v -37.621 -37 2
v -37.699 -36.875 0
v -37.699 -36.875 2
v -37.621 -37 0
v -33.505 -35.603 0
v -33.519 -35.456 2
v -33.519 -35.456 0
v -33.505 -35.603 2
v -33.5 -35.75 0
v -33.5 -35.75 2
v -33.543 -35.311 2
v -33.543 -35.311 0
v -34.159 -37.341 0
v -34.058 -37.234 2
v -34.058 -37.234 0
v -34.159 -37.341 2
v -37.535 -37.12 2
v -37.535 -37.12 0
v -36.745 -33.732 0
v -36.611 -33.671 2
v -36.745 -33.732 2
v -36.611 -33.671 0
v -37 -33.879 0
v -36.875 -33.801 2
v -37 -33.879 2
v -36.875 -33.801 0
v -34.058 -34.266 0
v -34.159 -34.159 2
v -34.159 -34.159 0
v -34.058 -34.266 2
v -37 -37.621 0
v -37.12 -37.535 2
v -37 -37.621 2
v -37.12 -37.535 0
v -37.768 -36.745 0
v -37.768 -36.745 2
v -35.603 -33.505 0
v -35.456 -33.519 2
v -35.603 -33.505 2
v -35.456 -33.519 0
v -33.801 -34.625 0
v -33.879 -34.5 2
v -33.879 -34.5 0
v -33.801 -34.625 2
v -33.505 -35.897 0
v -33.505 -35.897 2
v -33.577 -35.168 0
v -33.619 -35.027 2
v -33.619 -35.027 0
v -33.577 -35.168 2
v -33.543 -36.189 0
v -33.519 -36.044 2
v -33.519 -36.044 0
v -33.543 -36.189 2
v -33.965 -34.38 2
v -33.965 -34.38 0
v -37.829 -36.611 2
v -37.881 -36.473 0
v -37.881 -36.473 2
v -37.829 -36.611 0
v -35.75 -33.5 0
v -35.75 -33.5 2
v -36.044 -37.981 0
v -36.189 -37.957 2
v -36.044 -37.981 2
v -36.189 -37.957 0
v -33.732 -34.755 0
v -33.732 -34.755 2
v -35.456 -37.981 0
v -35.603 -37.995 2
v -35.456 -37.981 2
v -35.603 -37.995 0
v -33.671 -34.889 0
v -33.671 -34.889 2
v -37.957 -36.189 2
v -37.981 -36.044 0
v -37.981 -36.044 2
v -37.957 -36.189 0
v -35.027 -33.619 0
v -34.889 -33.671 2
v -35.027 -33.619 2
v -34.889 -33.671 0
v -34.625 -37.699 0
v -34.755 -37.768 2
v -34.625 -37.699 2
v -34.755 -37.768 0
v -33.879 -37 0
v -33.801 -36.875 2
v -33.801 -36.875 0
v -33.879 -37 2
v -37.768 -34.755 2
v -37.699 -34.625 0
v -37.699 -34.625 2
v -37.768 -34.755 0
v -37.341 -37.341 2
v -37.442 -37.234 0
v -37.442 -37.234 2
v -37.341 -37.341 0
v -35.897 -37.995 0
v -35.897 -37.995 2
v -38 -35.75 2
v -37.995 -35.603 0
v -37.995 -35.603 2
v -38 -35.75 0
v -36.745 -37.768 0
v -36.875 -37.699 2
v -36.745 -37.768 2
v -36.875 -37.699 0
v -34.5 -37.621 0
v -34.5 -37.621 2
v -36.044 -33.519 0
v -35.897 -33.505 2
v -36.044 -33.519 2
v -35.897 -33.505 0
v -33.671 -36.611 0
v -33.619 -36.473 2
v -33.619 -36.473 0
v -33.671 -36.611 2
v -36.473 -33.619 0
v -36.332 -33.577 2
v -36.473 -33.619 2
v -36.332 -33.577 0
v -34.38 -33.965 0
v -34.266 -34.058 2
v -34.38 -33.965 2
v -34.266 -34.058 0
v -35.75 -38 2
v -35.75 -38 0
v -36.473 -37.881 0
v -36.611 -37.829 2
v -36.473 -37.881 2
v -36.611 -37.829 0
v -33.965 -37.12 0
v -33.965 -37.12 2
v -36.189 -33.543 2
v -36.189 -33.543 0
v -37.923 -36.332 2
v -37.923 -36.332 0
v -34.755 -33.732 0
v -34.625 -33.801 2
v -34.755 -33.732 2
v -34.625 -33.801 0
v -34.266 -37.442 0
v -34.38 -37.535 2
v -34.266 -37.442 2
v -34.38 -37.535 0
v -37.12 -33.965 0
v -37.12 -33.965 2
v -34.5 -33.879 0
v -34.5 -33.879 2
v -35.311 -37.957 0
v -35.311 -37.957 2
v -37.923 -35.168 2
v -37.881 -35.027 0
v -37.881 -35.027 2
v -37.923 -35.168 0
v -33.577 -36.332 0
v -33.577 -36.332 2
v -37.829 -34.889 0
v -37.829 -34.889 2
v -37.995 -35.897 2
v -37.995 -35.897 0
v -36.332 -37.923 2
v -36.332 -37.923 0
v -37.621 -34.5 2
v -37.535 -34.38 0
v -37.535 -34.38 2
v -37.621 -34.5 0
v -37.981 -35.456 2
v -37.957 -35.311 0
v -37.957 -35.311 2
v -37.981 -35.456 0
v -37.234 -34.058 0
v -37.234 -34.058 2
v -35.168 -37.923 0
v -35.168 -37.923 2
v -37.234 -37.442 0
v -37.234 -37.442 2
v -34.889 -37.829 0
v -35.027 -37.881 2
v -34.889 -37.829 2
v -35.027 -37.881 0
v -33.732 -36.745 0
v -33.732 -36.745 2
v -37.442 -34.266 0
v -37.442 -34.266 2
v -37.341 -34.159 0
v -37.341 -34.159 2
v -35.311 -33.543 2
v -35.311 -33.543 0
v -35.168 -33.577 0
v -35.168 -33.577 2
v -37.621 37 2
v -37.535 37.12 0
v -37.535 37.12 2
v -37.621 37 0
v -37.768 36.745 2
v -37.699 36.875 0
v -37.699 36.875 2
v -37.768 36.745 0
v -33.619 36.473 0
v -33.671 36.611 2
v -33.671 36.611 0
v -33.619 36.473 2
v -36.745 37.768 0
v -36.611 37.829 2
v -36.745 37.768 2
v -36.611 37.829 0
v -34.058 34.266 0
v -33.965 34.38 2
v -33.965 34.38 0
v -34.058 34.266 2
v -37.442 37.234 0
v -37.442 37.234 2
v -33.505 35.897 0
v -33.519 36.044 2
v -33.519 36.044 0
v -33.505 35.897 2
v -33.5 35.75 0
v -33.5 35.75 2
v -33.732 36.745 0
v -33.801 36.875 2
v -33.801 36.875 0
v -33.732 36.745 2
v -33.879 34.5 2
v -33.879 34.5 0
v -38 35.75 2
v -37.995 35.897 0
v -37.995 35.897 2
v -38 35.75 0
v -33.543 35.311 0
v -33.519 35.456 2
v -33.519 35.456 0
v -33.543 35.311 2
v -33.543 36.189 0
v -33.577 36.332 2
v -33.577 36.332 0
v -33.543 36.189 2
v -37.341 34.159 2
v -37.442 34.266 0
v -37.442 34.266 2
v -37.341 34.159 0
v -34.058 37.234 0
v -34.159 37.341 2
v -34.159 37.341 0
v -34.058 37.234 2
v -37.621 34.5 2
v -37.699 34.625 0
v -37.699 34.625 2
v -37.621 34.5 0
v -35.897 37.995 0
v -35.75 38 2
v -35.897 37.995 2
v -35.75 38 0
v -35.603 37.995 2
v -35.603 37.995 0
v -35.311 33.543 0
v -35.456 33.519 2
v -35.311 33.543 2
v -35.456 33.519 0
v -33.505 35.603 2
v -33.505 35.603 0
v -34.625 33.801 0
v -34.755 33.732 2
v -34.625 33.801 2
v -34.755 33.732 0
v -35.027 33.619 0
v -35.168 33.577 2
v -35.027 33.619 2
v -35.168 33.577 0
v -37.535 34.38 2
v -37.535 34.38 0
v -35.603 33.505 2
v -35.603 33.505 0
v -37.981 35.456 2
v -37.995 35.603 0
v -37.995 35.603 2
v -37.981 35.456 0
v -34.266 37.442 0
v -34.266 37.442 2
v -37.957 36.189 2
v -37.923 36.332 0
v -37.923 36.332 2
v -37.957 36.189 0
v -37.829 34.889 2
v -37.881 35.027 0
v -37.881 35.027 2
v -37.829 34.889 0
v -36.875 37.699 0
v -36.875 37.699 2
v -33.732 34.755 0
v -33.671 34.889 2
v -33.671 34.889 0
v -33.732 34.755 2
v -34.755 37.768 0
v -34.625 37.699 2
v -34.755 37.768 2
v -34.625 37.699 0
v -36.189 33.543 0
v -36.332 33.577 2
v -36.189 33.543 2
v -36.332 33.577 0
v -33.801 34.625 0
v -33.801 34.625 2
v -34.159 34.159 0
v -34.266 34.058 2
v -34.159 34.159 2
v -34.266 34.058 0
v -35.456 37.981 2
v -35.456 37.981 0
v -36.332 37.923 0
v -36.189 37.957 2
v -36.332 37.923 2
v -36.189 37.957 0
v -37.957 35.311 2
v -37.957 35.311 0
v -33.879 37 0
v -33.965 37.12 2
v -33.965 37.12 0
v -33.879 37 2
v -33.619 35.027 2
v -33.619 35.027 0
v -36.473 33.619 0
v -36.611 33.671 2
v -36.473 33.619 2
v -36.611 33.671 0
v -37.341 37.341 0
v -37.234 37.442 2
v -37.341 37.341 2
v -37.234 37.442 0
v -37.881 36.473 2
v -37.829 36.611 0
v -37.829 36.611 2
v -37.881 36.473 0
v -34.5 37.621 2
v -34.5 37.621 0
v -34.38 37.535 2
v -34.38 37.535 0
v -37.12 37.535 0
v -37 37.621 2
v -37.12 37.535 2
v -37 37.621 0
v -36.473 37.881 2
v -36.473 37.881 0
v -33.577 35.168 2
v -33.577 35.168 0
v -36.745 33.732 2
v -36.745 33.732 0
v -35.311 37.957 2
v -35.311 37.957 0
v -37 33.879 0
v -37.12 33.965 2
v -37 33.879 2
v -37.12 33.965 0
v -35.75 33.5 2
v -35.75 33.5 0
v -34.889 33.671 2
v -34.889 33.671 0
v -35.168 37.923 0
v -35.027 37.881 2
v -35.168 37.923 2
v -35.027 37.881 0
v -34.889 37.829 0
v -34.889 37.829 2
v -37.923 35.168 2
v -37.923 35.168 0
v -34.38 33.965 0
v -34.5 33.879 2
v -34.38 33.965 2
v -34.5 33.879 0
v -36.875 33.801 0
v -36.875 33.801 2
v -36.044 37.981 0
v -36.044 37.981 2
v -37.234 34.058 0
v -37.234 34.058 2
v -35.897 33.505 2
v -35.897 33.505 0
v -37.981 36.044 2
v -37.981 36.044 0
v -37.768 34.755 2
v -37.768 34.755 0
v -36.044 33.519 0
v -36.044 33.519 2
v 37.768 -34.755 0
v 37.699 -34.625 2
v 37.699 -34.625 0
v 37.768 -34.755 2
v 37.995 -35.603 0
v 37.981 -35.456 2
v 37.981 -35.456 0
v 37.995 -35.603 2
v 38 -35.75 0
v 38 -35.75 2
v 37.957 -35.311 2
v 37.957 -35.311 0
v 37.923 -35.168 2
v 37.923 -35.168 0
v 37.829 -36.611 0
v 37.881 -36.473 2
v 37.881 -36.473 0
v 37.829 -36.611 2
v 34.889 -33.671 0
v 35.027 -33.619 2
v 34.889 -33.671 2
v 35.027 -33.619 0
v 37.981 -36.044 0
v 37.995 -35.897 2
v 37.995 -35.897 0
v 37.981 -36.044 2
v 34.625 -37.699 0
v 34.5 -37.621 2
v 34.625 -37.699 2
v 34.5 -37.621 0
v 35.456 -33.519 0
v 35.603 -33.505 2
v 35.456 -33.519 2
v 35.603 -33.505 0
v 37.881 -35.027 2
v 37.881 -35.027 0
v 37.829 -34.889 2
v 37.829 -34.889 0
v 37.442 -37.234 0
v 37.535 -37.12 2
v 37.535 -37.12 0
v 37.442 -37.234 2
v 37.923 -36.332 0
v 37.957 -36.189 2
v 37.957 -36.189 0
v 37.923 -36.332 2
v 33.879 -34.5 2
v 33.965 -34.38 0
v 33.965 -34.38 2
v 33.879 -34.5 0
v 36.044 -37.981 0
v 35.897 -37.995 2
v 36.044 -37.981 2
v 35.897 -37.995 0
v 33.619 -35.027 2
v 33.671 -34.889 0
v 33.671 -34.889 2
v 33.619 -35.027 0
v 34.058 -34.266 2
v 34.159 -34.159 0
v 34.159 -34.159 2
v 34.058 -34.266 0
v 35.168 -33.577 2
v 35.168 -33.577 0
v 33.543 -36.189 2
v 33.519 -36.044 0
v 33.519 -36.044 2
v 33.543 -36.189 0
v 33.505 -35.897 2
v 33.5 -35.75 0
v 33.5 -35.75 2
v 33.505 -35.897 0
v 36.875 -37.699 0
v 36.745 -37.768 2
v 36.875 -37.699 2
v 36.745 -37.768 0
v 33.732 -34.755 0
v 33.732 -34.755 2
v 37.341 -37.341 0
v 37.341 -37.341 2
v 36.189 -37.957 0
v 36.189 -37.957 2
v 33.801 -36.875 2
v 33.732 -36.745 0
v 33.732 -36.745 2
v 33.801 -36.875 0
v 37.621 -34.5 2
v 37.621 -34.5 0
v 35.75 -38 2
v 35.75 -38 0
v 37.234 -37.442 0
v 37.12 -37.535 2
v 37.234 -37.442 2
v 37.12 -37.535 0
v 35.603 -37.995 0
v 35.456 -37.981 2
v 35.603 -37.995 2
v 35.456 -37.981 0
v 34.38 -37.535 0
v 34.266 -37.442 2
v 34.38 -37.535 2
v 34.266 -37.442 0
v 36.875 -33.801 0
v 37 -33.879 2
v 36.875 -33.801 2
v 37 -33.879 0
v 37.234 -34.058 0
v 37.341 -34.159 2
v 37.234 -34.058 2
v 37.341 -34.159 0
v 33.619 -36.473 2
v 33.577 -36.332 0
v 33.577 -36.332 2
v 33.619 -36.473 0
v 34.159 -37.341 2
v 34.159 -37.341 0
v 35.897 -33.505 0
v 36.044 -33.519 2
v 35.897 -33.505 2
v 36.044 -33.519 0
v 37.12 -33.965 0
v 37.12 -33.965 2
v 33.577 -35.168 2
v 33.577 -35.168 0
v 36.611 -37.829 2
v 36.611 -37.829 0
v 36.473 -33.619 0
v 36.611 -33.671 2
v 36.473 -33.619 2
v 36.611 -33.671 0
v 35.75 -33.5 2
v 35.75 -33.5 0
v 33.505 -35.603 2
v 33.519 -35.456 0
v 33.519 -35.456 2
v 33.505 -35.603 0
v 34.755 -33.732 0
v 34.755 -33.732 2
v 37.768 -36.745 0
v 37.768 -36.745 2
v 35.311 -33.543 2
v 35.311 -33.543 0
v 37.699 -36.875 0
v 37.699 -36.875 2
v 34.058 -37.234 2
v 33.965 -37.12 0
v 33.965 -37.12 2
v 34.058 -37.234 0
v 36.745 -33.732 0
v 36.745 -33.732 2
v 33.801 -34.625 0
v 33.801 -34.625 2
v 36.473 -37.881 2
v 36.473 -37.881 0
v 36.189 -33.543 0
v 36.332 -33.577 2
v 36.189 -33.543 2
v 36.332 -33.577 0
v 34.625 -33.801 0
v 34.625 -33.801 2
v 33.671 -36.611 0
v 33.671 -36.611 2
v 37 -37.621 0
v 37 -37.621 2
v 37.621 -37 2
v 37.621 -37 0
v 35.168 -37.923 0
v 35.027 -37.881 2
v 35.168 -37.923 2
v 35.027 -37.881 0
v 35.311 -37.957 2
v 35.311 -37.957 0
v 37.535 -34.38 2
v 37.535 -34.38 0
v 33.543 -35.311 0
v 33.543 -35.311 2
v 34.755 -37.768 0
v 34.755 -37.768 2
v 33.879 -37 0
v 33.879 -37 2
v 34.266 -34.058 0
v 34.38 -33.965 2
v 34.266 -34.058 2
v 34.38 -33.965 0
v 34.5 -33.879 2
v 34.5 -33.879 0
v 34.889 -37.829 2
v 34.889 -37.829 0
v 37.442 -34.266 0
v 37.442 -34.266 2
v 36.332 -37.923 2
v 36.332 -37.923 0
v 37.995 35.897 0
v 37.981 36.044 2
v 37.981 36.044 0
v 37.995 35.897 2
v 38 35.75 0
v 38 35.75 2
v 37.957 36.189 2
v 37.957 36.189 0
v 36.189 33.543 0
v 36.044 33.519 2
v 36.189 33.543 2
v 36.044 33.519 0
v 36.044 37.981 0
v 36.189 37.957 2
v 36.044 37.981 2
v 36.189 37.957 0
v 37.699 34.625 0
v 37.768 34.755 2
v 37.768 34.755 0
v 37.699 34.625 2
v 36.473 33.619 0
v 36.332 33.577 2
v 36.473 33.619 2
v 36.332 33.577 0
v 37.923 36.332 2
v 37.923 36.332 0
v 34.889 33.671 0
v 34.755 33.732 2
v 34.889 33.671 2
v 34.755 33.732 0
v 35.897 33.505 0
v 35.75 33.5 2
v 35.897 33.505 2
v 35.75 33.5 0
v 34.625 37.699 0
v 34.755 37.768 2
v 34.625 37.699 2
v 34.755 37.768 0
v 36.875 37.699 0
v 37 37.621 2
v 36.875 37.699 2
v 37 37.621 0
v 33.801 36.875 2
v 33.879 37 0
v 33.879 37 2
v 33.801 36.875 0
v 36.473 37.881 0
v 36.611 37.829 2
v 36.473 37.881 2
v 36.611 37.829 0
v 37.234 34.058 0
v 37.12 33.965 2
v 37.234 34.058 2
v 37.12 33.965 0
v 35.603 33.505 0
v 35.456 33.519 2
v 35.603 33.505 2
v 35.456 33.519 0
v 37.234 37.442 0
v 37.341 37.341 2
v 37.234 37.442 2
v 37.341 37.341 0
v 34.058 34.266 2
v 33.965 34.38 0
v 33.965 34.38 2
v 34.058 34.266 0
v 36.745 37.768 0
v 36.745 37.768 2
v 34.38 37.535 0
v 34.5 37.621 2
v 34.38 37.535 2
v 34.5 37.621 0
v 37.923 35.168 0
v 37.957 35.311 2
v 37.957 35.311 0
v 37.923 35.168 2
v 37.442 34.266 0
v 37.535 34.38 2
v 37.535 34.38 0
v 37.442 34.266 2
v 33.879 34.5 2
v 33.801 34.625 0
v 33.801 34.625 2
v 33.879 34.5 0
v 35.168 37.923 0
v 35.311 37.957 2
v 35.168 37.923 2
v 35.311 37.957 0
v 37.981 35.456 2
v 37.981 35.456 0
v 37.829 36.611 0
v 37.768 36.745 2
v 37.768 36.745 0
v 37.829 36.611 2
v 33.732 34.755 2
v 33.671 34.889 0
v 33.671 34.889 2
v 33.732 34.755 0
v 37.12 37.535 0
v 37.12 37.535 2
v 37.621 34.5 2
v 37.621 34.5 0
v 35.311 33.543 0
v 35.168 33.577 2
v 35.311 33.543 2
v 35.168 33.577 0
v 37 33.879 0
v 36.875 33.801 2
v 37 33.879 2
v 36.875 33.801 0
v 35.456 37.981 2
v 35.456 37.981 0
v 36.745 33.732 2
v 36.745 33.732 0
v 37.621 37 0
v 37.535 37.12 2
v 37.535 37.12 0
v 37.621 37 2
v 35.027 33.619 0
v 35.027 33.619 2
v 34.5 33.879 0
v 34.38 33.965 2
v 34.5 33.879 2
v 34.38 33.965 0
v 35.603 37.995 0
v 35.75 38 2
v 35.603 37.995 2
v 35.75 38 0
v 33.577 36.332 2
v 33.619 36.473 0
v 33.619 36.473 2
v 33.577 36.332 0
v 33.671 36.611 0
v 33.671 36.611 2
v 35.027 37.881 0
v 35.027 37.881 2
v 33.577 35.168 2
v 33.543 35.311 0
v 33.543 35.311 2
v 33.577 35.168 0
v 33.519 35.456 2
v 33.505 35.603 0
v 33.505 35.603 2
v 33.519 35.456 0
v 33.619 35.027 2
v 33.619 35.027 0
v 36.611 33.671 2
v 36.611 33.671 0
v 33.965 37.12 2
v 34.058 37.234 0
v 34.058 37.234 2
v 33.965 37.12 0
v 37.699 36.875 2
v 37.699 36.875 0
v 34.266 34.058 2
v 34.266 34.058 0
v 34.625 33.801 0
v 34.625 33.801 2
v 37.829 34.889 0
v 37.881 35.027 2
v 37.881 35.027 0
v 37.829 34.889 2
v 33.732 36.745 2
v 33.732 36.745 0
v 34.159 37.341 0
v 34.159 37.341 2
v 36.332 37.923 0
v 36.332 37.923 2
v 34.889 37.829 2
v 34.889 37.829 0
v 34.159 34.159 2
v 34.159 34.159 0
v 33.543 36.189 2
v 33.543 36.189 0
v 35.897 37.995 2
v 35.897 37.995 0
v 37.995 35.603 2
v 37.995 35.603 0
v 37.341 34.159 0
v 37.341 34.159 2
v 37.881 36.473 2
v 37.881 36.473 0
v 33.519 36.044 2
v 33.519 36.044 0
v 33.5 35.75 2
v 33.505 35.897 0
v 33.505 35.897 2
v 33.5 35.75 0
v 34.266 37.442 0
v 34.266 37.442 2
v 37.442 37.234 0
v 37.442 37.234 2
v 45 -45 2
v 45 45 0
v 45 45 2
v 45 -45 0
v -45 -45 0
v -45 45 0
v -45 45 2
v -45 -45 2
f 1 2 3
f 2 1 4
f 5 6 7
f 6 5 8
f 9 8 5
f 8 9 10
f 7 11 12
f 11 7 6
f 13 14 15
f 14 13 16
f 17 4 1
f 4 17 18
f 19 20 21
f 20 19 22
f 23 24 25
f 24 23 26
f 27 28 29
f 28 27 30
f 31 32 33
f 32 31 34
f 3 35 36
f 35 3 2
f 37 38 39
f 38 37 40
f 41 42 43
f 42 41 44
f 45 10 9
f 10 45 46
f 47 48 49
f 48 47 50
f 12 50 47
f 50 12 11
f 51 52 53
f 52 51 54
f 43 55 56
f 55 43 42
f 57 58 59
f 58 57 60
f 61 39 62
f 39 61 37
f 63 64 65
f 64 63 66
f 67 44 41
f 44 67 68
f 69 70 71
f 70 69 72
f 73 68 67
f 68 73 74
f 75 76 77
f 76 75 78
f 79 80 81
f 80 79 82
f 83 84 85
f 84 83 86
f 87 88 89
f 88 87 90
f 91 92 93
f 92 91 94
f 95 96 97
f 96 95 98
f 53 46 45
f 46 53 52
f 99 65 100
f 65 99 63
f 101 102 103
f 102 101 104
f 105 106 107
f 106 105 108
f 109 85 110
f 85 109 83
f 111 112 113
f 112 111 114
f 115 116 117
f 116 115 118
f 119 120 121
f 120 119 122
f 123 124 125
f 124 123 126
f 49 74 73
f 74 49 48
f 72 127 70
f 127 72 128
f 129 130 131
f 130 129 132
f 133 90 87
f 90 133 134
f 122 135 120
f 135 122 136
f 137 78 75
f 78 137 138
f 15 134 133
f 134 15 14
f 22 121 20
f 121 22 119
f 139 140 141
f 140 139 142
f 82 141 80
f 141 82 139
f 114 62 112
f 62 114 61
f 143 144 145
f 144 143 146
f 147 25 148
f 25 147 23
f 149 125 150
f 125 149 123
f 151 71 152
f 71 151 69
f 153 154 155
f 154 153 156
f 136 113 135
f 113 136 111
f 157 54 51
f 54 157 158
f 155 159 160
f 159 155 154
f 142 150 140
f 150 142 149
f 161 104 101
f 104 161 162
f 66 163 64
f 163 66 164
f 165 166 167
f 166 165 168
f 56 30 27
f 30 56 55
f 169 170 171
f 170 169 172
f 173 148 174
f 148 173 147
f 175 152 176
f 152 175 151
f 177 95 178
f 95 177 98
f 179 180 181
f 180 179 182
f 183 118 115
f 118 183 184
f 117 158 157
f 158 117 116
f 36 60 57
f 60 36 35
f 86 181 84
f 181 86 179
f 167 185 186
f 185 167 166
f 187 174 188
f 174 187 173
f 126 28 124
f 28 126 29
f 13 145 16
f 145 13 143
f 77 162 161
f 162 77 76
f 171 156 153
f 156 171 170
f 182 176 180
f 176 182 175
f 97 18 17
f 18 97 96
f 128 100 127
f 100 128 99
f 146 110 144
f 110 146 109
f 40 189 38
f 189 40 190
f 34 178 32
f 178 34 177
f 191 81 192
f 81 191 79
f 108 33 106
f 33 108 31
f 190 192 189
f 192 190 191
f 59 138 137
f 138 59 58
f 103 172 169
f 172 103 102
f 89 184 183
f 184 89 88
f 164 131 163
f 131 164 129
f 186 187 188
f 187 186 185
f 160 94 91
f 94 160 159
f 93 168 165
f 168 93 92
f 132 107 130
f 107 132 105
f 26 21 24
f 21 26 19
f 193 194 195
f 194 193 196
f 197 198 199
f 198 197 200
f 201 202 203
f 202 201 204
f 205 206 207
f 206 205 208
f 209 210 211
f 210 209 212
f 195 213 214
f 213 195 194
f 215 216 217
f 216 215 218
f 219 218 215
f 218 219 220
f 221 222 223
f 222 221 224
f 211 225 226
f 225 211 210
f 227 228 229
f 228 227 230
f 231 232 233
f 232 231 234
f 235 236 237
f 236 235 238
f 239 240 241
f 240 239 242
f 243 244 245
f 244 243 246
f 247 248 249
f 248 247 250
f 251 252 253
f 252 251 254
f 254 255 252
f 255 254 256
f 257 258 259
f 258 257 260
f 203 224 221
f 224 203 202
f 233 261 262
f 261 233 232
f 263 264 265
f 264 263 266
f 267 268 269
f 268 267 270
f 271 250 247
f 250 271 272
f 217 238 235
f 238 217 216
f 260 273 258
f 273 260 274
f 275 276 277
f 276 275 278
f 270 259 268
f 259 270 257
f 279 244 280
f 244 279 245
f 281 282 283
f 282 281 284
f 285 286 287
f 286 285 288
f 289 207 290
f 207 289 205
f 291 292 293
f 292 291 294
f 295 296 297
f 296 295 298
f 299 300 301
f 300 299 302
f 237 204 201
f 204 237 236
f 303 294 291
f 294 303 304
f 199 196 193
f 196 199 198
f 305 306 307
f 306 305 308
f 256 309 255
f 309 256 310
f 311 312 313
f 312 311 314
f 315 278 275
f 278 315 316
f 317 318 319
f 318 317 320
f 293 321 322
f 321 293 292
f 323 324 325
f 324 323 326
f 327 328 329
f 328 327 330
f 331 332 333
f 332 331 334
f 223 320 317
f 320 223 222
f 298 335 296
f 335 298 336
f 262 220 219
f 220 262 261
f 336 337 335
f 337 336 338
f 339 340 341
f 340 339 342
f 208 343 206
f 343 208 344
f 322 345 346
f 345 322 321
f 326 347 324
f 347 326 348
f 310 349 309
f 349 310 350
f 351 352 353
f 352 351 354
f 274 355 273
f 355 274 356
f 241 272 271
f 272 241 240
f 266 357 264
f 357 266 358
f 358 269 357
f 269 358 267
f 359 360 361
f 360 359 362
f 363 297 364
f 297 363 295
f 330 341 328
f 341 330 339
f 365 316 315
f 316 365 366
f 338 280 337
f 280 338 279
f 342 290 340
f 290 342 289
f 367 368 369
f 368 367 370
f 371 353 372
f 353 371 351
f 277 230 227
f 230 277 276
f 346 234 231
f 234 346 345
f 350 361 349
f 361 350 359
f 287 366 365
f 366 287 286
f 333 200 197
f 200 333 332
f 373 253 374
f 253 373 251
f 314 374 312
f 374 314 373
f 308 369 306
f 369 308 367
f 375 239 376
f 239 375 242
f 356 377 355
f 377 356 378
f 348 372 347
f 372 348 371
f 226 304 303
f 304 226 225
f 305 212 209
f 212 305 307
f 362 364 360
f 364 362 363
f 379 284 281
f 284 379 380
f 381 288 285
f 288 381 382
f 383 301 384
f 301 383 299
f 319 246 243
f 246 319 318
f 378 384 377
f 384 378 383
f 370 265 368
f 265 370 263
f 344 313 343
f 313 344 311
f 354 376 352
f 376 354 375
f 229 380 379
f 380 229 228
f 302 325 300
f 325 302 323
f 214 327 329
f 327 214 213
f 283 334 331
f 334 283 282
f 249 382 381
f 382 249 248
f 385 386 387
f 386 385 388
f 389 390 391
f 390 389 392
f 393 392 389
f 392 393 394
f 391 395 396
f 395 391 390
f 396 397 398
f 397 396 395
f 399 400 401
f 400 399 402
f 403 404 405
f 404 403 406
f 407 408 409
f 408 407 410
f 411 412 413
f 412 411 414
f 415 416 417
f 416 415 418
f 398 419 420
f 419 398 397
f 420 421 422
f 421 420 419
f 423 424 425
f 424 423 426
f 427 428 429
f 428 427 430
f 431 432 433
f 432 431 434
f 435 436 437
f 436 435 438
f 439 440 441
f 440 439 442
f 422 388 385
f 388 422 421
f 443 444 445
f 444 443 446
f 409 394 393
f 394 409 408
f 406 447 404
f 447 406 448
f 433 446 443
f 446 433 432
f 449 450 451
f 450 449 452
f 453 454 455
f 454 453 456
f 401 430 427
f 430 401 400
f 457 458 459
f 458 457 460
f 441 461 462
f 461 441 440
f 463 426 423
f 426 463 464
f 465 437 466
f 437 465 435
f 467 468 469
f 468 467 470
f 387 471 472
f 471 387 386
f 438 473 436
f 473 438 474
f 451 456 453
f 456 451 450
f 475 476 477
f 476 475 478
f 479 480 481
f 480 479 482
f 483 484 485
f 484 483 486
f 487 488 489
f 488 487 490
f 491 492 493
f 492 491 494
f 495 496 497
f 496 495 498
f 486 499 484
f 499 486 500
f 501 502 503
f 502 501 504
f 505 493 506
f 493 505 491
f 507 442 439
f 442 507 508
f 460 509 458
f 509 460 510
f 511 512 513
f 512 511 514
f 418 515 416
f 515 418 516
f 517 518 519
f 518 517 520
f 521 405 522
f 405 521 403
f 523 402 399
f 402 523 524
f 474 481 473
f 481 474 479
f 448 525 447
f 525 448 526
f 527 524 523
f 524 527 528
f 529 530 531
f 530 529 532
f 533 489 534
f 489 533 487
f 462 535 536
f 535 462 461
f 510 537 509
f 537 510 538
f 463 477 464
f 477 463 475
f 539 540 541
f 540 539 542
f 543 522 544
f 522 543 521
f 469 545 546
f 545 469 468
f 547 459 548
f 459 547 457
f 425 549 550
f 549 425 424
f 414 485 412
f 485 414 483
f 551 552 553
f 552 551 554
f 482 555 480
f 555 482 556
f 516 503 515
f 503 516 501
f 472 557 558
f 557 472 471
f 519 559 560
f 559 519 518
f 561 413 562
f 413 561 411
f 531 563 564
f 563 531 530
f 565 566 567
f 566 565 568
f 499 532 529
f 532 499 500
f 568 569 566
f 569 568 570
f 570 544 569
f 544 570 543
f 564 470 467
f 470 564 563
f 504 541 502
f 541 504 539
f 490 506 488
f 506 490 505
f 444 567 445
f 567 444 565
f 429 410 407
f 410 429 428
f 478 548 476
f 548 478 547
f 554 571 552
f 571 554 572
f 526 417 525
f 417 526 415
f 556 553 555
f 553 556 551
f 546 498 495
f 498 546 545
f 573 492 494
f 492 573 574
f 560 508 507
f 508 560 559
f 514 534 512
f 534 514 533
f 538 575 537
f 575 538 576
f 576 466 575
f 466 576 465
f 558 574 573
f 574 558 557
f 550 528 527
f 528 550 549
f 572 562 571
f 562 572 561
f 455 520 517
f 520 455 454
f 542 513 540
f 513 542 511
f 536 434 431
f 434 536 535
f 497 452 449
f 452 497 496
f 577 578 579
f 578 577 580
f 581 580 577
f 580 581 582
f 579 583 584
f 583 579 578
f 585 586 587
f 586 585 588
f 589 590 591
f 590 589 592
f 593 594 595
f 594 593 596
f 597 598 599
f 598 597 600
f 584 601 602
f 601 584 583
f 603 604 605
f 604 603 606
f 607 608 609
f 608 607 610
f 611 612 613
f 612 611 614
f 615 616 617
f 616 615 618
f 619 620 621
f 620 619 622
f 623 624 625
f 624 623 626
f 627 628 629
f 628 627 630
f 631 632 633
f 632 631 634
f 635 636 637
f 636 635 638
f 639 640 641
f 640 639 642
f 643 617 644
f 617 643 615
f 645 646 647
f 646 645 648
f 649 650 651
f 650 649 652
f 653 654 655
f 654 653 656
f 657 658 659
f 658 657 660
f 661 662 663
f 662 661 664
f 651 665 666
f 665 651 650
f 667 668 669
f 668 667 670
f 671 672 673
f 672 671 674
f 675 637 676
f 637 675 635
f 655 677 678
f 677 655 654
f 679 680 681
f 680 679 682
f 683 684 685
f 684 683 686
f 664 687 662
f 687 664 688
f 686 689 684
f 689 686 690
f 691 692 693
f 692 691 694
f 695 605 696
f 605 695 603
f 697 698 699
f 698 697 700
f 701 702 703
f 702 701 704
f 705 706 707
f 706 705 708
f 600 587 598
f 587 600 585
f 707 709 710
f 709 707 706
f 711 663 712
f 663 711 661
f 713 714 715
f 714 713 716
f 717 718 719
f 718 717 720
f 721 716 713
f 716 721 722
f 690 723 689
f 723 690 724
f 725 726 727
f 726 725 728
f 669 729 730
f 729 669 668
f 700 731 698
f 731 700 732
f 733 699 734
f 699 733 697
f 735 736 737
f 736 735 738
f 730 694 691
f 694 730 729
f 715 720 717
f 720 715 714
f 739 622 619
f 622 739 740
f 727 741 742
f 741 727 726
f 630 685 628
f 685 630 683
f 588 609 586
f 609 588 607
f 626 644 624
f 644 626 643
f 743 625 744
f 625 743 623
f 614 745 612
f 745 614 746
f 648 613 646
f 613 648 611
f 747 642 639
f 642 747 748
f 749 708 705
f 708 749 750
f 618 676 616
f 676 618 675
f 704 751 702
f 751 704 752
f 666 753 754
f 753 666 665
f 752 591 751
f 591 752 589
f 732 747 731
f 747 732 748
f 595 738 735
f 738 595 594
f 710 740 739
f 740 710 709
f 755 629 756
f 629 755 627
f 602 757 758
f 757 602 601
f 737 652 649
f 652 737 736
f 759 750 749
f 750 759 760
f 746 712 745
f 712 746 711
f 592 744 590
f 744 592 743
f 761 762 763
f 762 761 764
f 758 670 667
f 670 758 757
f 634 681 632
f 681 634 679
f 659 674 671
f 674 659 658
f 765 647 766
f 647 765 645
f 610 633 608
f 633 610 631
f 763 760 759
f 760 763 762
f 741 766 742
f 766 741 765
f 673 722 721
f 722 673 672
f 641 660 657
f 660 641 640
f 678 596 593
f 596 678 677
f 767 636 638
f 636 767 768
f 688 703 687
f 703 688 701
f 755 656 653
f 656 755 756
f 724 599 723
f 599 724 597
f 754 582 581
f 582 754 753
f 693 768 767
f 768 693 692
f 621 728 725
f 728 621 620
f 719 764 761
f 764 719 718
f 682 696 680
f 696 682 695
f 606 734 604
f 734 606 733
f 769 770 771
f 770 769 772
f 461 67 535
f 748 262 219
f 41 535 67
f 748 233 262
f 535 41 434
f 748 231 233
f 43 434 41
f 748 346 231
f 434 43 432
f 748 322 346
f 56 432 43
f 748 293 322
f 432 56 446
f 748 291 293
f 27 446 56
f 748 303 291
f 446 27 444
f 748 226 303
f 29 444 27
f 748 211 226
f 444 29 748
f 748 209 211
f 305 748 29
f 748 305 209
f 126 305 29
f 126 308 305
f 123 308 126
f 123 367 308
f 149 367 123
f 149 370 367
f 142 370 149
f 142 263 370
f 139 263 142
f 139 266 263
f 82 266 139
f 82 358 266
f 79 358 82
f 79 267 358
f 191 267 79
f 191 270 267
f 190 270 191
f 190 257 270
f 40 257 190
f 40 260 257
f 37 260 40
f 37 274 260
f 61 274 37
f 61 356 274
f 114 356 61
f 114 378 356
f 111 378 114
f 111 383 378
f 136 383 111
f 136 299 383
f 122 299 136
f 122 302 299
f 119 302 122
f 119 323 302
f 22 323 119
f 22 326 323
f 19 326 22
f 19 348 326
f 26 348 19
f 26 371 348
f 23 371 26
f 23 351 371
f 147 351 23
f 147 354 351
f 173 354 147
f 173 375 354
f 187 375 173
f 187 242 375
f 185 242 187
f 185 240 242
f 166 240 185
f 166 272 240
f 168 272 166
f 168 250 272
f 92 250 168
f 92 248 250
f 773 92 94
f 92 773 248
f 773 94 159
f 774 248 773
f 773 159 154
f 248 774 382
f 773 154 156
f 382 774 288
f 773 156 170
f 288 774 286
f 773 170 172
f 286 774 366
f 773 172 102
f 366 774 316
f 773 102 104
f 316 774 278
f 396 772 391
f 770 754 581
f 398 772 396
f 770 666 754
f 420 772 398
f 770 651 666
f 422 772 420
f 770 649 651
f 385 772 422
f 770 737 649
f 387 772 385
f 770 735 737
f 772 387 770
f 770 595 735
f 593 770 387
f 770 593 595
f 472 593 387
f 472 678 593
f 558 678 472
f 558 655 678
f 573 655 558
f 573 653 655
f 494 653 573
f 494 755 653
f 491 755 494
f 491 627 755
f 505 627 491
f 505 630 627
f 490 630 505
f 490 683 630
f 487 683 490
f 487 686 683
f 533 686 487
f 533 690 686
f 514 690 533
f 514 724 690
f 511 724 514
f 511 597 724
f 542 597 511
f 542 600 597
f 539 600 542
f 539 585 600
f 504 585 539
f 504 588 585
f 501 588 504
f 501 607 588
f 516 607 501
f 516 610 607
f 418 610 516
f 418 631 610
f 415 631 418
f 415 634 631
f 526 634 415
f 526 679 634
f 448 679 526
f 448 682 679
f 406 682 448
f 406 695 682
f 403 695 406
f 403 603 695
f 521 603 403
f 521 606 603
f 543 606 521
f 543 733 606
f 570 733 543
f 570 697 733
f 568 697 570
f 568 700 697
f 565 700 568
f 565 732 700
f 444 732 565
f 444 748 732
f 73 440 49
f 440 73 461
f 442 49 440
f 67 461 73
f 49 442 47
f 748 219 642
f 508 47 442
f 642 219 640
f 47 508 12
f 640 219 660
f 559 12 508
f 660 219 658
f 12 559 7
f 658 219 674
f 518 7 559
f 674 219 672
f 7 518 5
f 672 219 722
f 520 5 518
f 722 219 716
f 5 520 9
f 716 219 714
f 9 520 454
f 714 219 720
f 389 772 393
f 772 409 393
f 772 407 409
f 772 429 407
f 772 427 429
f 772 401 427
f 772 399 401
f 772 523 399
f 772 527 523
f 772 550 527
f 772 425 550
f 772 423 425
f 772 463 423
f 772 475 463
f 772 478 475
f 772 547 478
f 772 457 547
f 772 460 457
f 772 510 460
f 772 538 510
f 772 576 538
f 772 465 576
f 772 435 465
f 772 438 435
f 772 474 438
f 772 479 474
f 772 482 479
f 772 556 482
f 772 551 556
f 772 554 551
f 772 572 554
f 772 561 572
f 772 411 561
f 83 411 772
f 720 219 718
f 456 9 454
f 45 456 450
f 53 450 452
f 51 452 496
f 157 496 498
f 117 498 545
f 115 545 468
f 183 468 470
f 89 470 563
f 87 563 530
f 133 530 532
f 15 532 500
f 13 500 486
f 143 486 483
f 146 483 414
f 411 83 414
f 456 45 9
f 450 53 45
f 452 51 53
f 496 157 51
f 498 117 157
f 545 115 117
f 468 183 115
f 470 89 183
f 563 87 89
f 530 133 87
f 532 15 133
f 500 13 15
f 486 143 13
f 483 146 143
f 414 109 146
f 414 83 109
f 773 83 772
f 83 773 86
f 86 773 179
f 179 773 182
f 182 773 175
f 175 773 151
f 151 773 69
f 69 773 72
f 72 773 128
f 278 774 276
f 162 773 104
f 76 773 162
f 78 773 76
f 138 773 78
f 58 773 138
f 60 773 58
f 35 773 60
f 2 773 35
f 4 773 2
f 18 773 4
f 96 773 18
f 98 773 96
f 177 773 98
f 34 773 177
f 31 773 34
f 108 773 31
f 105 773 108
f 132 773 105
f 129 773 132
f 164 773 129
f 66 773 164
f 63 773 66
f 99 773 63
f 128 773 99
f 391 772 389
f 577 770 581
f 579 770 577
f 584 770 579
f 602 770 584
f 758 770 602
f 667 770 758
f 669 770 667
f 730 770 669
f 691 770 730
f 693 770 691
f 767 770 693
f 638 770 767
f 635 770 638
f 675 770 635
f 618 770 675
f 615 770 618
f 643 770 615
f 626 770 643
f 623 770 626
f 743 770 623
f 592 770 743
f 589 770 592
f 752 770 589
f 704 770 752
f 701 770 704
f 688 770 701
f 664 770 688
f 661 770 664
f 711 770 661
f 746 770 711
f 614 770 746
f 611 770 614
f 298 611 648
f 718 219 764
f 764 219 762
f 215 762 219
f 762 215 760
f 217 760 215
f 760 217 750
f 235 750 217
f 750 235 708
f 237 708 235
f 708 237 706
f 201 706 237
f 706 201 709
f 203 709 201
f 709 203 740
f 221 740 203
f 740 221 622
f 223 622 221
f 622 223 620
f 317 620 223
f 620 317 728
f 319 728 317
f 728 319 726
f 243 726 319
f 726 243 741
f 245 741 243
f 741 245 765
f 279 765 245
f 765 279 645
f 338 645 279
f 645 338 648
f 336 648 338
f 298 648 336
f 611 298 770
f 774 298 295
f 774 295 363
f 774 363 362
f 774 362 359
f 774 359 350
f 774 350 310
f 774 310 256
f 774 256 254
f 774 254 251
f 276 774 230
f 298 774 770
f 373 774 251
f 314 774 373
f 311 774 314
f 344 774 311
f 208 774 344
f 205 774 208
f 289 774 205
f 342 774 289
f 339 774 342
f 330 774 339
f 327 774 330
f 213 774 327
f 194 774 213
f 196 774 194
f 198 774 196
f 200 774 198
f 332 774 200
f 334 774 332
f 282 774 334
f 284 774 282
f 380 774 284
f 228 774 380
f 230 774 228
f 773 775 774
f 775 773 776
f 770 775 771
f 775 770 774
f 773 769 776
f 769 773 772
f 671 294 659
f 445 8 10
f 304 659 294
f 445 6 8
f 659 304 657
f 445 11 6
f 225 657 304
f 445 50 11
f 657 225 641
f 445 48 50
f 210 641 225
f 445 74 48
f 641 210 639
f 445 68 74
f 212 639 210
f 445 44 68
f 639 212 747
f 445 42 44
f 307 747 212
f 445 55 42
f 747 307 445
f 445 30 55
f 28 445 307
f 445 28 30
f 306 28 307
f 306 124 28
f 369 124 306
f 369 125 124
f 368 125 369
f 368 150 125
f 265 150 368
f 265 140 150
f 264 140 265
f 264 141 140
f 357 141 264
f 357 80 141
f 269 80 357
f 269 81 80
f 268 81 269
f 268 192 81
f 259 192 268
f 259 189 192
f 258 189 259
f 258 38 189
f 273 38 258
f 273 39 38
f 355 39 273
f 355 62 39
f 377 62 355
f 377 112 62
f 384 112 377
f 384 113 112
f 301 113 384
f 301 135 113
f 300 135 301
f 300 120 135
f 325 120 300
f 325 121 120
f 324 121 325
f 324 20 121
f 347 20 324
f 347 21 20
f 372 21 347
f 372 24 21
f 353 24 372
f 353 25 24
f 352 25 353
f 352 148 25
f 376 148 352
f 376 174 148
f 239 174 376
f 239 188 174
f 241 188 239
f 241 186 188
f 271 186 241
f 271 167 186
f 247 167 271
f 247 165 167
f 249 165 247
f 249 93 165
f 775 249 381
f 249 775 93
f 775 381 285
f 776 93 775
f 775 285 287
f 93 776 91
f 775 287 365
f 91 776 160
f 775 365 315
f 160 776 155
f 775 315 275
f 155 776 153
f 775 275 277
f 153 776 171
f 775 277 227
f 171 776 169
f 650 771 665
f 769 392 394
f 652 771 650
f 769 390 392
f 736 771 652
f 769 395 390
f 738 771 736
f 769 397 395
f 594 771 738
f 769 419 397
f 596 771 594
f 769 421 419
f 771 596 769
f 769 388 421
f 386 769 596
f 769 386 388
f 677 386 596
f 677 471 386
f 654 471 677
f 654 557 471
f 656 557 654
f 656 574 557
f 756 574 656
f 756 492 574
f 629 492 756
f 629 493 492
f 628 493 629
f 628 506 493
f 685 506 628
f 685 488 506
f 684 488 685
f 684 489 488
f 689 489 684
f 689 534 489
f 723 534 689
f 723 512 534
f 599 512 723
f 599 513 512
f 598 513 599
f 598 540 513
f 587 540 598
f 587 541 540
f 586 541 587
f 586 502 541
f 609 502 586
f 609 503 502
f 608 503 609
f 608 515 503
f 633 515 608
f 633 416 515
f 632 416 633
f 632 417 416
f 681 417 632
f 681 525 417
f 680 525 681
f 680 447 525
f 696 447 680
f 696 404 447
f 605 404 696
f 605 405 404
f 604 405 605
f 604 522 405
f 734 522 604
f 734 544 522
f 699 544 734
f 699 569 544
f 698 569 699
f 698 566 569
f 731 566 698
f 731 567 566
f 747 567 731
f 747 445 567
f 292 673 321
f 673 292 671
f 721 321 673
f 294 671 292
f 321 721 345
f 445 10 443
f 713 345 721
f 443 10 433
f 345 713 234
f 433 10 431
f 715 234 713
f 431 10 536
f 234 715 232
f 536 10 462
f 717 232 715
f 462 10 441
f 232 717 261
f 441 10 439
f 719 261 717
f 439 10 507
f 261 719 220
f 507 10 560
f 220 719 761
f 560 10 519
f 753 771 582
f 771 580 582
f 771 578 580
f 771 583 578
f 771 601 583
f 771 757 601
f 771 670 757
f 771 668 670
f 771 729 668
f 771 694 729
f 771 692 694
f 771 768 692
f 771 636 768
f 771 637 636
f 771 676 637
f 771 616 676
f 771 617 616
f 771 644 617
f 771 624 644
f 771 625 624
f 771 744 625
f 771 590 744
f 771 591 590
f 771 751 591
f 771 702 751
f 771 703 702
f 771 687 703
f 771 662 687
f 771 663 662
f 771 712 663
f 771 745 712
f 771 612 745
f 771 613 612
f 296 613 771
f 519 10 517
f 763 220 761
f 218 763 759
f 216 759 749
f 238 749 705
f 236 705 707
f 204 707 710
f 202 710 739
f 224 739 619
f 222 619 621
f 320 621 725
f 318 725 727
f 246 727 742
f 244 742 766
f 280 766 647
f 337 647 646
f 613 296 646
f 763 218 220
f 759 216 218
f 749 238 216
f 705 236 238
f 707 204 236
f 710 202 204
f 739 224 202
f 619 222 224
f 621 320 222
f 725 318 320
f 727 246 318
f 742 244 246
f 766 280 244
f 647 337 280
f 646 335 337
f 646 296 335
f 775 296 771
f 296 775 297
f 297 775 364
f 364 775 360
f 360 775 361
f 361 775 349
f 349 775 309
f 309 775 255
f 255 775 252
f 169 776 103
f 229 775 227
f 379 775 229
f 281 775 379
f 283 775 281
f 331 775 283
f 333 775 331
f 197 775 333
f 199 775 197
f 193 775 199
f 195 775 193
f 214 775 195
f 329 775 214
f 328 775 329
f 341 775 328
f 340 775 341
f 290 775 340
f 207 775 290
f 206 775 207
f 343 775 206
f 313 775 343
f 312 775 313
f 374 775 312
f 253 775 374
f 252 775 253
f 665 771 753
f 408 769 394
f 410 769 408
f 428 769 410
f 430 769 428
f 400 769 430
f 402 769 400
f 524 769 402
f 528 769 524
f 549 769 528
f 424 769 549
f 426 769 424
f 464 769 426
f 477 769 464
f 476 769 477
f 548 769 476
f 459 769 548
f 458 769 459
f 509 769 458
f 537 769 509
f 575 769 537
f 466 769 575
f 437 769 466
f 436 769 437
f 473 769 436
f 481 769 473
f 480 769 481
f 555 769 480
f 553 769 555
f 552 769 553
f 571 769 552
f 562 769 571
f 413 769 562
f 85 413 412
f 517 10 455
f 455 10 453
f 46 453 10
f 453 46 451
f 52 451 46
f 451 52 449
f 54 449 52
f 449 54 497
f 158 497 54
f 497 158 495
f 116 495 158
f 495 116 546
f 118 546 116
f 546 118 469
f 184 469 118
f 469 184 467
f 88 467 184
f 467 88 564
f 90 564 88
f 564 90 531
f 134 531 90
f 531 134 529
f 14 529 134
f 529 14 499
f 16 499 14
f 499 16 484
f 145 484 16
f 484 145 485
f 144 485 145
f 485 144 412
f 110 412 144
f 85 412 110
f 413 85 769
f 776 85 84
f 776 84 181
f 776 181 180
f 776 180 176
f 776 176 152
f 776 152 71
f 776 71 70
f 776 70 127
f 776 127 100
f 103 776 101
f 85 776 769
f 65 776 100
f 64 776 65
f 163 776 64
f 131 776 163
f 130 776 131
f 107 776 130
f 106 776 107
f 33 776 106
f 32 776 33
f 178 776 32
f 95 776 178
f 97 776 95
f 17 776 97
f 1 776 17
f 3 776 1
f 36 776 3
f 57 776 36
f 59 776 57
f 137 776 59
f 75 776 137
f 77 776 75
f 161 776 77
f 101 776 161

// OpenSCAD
// DIY magnetic stirrer housing for 80 mm PC case fan
// Print orientation: top plate on bed (z = 0), walls rise to open top (z = 40)

// ---------- Parameters ----------
fan_d        = 80;    // fan diameter (mm)
outer_x      = 90;    // outer size in X (mm)
outer_y      = 90;    // outer size in Y (mm)
wall         = 2.5;   // wall thickness (mm)
top_t        = 2;     // top plate thickness (mm)
open_h       = 40 - top_t; // open top height from top of plate (mm)
screw_d      = 4.5;   // M4 screw hole diameter (mm)
screw_pitch  = 71.5;  // square pattern size for screw holes (mm)
notch_w      = 12;    // power cable notch width (mm)
notch_depth  = 8;     // notch depth down from open edge (mm)
eps          = 0.5;   // cutter overshoot past faces (mm)
$fn          = 96;    // curve resolution

// ---------- Model ----------
difference() {
    // Outer block
    translate([-outer_x/2, -outer_y/2, 0])
        cube([outer_x, outer_y, top_t + open_h]);

    // Open top (no lid)
    translate([-outer_x/2, -outer_y/2, top_t])
        cube([outer_x, outer_y, open_h + eps]);

    // Screw holes through top plate
    for (sx = [-screw_pitch/2, screw_pitch/2])
        for (sy = [-screw_pitch/2, screw_pitch/2])
            translate([sx, sy, -eps])
                cylinder(d = screw_d, h = top_t + 2*eps);

    // Power cable notch in one wall (centred along wall, z = 32 to 40)
    translate([-outer_x/2, -notch_w/2, top_t + open_h - notch_depth])
        cube([outer_x, notch_w, notch_depth + eps]);
}
